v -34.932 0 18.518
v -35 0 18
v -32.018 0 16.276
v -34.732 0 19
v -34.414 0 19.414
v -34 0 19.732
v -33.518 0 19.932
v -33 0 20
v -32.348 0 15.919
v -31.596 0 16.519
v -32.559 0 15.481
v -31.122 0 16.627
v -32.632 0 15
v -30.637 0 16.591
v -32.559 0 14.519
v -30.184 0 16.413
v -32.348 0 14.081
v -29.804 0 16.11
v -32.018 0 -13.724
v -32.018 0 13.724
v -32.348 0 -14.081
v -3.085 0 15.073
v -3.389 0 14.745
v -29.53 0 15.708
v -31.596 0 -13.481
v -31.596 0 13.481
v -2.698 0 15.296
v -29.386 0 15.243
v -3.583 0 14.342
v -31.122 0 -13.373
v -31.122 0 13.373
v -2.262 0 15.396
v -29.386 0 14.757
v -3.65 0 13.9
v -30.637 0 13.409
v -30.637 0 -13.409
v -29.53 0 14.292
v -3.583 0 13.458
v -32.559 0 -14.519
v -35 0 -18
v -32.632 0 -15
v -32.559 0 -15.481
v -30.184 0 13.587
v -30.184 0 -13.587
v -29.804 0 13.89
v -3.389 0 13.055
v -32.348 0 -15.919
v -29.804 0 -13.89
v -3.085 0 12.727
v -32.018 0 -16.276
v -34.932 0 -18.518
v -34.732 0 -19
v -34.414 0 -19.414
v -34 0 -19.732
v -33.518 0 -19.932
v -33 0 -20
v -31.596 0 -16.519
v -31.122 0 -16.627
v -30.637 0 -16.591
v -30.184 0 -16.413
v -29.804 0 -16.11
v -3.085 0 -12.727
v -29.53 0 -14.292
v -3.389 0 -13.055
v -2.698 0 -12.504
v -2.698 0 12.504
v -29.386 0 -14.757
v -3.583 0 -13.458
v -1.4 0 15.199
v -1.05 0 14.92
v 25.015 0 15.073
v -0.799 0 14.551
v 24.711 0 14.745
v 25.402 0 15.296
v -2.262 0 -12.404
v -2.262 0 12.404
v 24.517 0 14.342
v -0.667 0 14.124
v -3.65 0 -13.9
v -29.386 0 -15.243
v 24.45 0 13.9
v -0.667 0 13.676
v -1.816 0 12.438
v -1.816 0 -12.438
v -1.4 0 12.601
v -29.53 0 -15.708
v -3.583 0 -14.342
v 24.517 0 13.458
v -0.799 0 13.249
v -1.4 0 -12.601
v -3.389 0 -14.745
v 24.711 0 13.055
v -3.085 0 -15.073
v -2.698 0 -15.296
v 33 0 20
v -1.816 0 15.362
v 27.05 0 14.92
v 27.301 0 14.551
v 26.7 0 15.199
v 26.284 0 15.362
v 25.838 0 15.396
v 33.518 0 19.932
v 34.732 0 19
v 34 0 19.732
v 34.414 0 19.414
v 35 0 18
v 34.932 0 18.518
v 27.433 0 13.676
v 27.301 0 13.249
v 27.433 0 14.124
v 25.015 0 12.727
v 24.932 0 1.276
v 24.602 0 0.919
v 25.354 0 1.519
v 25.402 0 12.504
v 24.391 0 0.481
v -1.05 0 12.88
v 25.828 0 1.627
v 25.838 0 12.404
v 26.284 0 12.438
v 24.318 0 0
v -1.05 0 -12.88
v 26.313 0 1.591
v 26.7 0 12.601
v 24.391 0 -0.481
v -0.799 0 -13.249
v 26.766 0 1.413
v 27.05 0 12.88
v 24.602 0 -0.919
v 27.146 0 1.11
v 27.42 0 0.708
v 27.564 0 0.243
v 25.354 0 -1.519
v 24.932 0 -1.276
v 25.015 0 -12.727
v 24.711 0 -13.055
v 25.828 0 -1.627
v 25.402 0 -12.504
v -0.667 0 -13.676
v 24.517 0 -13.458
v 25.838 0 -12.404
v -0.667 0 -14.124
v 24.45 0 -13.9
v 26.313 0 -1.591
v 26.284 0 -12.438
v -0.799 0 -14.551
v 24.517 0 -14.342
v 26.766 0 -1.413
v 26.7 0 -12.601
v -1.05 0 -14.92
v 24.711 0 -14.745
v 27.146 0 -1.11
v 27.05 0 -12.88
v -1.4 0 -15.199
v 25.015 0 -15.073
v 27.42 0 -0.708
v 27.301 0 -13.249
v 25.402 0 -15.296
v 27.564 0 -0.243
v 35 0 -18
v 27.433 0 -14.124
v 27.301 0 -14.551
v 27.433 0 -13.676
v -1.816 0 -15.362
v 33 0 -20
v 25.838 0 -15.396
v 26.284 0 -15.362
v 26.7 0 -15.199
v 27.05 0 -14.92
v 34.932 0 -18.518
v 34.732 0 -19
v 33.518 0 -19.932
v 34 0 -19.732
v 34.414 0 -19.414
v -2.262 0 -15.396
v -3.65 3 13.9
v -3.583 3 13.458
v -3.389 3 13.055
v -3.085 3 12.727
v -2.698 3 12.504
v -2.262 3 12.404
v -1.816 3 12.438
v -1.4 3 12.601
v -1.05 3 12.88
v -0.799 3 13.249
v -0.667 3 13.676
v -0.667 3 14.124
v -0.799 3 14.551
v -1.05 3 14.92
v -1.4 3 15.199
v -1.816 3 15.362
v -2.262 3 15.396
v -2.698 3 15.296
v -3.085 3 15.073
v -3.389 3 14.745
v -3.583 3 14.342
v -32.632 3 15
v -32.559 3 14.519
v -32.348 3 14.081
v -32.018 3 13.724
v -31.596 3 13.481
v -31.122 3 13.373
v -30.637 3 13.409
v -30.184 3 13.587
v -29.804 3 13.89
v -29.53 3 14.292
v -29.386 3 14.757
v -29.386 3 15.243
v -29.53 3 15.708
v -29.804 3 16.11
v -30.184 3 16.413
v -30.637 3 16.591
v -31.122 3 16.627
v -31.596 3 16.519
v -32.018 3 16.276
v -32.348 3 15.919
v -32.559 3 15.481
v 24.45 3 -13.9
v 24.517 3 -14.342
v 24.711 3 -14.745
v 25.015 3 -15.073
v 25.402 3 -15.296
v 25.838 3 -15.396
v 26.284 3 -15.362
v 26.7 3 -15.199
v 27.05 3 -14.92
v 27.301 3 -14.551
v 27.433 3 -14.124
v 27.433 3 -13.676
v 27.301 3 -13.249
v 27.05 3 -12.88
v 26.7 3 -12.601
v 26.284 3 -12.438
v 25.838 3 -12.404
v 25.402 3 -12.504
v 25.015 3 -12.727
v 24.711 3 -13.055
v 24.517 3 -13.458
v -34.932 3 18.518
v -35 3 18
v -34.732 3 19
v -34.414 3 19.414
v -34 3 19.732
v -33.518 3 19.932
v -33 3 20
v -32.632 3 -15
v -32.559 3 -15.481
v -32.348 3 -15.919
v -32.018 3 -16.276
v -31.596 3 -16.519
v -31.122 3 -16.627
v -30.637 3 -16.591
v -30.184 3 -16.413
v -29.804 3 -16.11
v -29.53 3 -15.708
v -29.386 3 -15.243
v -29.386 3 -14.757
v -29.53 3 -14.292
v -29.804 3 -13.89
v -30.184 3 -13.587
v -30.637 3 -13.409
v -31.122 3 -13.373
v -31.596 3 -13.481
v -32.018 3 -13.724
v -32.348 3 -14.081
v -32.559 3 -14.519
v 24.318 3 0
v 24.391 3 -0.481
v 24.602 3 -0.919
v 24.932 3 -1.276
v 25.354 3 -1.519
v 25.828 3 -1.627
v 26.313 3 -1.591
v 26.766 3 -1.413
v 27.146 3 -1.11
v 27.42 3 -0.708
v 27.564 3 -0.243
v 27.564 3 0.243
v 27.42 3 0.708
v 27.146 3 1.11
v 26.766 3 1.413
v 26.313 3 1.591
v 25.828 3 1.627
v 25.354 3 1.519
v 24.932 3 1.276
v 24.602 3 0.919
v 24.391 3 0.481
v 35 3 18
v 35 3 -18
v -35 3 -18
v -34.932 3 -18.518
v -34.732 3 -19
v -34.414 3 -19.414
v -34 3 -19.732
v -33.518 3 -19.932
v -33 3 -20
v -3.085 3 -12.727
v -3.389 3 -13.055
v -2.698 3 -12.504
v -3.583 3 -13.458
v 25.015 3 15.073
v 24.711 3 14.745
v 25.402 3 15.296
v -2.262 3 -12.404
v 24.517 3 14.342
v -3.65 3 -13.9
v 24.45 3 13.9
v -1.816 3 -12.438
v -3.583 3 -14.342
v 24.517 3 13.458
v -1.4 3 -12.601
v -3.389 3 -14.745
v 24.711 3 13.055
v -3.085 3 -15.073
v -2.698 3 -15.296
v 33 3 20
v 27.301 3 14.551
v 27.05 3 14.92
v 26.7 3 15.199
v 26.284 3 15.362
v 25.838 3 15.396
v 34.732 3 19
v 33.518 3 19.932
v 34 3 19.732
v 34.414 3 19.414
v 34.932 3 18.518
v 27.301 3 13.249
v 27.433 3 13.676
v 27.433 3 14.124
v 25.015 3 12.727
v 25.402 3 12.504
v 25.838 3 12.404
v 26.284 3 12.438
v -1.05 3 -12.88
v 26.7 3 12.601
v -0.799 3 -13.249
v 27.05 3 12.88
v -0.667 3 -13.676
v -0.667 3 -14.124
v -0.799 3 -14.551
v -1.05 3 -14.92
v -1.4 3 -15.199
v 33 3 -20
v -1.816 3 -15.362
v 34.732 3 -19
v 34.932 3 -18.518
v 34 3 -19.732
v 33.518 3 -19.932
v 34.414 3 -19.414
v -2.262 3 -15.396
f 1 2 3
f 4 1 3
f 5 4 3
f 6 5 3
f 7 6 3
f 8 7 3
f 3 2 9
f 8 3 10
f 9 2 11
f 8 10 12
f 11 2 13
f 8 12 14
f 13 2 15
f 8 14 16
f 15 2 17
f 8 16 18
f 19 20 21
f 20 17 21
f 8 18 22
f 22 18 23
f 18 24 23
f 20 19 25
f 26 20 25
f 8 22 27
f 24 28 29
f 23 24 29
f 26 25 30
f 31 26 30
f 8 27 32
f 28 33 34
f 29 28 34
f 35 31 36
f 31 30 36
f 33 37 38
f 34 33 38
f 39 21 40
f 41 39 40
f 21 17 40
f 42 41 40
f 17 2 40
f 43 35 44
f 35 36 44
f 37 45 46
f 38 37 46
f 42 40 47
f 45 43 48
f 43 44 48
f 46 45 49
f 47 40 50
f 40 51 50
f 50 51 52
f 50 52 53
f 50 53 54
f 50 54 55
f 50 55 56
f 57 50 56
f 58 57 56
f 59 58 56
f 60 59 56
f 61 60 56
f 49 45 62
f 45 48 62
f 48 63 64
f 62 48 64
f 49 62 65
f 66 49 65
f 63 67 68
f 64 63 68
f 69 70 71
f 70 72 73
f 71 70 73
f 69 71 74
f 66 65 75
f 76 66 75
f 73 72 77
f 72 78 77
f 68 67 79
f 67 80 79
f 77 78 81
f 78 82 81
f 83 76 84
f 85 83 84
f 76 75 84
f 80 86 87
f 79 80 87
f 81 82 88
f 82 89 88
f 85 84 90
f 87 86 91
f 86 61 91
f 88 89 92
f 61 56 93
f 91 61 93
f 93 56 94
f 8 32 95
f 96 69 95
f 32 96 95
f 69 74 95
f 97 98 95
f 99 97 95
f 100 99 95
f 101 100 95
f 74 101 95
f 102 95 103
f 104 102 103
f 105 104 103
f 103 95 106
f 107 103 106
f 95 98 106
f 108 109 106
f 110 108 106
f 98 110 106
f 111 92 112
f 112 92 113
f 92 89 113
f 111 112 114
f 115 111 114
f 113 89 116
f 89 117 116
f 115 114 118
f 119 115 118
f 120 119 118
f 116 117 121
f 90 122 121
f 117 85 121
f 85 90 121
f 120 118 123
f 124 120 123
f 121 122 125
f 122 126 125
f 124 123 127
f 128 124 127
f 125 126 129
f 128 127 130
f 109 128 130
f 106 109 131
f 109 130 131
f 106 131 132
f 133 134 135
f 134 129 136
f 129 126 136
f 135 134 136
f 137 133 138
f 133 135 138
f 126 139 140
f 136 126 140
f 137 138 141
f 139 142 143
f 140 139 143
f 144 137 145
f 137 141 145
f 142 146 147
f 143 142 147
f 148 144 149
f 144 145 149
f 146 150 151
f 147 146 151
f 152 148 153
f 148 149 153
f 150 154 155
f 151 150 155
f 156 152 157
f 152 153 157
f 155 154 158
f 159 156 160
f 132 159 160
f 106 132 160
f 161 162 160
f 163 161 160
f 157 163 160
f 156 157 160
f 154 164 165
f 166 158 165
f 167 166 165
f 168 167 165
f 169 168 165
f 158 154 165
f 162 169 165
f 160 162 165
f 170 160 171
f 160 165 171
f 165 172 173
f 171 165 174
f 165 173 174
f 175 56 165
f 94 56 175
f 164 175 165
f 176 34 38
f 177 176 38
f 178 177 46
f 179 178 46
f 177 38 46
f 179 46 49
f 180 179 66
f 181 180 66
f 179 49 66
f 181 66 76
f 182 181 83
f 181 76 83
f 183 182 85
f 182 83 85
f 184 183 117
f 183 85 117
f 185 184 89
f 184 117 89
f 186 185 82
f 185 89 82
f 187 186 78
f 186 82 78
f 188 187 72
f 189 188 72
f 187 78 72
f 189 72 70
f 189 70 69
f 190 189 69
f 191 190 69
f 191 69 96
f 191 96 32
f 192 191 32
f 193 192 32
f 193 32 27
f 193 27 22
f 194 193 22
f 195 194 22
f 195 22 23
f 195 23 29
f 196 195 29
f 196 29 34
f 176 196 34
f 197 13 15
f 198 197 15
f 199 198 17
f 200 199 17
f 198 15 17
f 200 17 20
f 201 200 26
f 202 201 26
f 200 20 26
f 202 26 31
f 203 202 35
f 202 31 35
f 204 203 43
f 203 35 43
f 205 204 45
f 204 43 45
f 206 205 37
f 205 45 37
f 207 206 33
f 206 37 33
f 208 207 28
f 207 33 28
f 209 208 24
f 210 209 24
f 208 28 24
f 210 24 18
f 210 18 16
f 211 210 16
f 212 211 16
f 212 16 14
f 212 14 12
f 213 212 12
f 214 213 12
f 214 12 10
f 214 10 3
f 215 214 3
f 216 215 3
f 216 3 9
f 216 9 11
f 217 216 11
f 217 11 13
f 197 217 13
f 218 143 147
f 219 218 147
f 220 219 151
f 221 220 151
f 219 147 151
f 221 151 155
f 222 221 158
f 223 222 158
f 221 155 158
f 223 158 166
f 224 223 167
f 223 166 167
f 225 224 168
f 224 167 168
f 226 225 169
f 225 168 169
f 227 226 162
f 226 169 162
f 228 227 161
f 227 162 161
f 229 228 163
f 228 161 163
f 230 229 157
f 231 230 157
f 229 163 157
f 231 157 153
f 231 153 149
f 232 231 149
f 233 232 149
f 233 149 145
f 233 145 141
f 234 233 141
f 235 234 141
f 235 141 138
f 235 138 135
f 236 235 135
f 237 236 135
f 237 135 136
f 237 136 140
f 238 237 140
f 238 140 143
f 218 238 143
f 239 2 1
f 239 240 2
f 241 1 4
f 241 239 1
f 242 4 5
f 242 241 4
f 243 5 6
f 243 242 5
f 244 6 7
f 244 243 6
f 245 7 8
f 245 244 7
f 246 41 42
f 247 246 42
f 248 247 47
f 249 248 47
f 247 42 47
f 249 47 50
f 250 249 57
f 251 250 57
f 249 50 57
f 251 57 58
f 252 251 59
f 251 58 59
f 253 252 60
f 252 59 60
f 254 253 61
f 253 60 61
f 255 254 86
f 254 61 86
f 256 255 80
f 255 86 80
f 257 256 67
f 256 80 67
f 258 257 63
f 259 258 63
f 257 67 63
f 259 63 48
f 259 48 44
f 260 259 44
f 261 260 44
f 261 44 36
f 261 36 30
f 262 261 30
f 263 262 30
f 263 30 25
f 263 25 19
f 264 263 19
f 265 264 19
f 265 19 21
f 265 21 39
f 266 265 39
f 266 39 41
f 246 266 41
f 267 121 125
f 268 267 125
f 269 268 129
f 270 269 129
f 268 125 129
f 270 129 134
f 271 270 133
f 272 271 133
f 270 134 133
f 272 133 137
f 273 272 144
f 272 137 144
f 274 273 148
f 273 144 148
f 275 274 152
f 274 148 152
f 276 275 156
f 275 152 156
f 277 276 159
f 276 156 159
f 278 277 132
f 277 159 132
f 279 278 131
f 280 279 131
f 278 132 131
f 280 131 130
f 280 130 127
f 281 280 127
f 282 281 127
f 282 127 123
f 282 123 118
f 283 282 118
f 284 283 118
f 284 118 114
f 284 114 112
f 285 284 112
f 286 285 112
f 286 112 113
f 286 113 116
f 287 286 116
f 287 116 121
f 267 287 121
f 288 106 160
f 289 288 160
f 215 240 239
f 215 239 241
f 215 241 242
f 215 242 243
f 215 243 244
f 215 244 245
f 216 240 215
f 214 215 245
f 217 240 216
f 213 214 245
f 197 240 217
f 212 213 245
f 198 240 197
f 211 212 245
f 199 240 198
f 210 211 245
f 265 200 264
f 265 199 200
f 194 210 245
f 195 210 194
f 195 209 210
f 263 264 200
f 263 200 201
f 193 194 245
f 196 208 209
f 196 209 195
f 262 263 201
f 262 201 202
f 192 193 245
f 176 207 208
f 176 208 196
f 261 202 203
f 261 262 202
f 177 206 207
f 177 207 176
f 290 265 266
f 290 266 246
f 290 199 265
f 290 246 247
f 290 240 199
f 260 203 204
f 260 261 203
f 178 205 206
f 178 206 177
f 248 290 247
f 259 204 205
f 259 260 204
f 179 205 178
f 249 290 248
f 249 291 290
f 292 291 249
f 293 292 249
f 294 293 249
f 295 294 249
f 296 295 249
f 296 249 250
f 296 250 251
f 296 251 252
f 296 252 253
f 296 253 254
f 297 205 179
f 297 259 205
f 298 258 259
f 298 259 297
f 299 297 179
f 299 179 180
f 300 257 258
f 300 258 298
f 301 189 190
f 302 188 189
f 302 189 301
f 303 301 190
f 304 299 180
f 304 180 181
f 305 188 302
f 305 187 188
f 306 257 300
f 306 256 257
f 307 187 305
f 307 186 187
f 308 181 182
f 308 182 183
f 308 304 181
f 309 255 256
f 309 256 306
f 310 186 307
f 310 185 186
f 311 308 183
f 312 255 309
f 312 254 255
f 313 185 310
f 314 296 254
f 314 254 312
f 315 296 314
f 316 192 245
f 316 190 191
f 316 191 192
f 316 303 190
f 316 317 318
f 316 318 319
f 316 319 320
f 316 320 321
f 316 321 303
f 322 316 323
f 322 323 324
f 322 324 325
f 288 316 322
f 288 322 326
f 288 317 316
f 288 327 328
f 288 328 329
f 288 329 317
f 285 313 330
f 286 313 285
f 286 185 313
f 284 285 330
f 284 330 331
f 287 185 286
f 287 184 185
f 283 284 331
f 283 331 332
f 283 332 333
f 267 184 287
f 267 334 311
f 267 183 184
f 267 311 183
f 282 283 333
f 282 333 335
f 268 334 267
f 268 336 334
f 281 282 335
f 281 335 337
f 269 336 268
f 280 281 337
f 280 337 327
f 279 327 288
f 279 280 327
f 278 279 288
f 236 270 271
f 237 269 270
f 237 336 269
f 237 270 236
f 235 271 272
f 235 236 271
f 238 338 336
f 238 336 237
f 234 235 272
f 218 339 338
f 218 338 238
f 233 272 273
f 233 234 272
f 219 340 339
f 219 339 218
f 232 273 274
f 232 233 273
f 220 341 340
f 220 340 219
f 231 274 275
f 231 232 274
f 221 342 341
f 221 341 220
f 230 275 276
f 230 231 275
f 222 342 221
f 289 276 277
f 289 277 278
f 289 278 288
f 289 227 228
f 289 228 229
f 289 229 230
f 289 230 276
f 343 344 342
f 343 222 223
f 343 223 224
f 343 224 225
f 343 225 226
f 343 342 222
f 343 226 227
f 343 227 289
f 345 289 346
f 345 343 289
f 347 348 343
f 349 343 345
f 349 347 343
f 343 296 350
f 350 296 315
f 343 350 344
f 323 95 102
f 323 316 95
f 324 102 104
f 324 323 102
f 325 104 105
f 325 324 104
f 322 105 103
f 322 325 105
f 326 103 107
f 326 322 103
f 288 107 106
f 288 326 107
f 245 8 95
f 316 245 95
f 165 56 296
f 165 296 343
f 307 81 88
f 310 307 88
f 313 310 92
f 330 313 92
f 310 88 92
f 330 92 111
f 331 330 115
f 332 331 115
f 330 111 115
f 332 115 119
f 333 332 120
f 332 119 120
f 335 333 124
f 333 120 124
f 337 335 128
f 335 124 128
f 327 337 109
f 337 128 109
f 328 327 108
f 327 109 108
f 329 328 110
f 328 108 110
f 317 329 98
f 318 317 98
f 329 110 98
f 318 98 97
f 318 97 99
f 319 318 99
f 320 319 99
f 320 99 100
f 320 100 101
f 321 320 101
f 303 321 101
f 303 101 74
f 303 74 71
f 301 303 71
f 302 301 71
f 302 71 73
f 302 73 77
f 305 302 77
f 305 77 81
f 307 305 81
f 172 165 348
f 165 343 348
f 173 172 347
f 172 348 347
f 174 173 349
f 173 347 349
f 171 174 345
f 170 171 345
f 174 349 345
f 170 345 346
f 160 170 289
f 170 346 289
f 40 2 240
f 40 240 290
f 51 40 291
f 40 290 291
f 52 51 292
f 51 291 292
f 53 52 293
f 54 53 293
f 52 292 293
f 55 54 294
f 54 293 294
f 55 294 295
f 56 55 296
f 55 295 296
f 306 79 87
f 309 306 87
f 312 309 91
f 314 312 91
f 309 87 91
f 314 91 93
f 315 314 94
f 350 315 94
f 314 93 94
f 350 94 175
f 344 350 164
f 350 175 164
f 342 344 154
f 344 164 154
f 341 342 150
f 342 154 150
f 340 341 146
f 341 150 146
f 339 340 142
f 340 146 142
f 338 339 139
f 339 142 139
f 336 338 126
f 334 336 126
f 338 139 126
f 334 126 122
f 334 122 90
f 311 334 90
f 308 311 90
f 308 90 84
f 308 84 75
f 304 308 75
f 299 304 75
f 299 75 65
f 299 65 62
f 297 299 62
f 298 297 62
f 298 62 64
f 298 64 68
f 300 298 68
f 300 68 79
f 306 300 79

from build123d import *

# Parameters (mm, degrees)
SKETCH1_W             = 70
SKETCH1_H             = 40
BOSS_EXTRUDE1_DEPTH   = 3
F_3_0MM_DOWEL_HOLE1_D = 3
F_4_CLEARANCE_HOLE1_D = 3.2639
FILLET1_R             = 2


with BuildPart() as part:
    # Sketch1 → Boss-Extrude1 (new body)
    with BuildSketch(Plane(origin=(0, 0, 0), x_dir=(1, 0, 0), z_dir=(0, 1, 0))):
        Rectangle(SKETCH1_W, SKETCH1_H)
    extrude(amount=BOSS_EXTRUDE1_DEPTH)

    # Ø3.0mm Dowel Hole1 (through all)
    with Locations(Plane(origin=(0, 3, 0), x_dir=(1, 0, 0), z_dir=(0, 1, 0))):
        with Locations((-2.15, 13.9), (25.95, 13.9), (-2.15, -13.9), (25.95, -13.9)):
            Hole(F_3_0MM_DOWEL_HOLE1_D / 2)

    # #4 Clearance Hole1 (through all)
    with Locations(Plane(origin=(0, 3, 0), x_dir=(1, 0, 0), z_dir=(0, 1, 0))):
        with Locations((-31, 15), (-31, -15), (25.95, 0)):
            Hole(F_4_CLEARANCE_HOLE1_D / 2)

    # Fillet1
    fillet1_edges = [part.edges().sort_by_distance(p)[0] for p in [
        (35, 1.5, 20),
        (-35, 1.5, 20),
        (-35, 1.5, -20),
        (35, 1.5, -20),
    ]]
    fillet(fillet1_edges, radius=FILLET1_R)


solid = part.part
